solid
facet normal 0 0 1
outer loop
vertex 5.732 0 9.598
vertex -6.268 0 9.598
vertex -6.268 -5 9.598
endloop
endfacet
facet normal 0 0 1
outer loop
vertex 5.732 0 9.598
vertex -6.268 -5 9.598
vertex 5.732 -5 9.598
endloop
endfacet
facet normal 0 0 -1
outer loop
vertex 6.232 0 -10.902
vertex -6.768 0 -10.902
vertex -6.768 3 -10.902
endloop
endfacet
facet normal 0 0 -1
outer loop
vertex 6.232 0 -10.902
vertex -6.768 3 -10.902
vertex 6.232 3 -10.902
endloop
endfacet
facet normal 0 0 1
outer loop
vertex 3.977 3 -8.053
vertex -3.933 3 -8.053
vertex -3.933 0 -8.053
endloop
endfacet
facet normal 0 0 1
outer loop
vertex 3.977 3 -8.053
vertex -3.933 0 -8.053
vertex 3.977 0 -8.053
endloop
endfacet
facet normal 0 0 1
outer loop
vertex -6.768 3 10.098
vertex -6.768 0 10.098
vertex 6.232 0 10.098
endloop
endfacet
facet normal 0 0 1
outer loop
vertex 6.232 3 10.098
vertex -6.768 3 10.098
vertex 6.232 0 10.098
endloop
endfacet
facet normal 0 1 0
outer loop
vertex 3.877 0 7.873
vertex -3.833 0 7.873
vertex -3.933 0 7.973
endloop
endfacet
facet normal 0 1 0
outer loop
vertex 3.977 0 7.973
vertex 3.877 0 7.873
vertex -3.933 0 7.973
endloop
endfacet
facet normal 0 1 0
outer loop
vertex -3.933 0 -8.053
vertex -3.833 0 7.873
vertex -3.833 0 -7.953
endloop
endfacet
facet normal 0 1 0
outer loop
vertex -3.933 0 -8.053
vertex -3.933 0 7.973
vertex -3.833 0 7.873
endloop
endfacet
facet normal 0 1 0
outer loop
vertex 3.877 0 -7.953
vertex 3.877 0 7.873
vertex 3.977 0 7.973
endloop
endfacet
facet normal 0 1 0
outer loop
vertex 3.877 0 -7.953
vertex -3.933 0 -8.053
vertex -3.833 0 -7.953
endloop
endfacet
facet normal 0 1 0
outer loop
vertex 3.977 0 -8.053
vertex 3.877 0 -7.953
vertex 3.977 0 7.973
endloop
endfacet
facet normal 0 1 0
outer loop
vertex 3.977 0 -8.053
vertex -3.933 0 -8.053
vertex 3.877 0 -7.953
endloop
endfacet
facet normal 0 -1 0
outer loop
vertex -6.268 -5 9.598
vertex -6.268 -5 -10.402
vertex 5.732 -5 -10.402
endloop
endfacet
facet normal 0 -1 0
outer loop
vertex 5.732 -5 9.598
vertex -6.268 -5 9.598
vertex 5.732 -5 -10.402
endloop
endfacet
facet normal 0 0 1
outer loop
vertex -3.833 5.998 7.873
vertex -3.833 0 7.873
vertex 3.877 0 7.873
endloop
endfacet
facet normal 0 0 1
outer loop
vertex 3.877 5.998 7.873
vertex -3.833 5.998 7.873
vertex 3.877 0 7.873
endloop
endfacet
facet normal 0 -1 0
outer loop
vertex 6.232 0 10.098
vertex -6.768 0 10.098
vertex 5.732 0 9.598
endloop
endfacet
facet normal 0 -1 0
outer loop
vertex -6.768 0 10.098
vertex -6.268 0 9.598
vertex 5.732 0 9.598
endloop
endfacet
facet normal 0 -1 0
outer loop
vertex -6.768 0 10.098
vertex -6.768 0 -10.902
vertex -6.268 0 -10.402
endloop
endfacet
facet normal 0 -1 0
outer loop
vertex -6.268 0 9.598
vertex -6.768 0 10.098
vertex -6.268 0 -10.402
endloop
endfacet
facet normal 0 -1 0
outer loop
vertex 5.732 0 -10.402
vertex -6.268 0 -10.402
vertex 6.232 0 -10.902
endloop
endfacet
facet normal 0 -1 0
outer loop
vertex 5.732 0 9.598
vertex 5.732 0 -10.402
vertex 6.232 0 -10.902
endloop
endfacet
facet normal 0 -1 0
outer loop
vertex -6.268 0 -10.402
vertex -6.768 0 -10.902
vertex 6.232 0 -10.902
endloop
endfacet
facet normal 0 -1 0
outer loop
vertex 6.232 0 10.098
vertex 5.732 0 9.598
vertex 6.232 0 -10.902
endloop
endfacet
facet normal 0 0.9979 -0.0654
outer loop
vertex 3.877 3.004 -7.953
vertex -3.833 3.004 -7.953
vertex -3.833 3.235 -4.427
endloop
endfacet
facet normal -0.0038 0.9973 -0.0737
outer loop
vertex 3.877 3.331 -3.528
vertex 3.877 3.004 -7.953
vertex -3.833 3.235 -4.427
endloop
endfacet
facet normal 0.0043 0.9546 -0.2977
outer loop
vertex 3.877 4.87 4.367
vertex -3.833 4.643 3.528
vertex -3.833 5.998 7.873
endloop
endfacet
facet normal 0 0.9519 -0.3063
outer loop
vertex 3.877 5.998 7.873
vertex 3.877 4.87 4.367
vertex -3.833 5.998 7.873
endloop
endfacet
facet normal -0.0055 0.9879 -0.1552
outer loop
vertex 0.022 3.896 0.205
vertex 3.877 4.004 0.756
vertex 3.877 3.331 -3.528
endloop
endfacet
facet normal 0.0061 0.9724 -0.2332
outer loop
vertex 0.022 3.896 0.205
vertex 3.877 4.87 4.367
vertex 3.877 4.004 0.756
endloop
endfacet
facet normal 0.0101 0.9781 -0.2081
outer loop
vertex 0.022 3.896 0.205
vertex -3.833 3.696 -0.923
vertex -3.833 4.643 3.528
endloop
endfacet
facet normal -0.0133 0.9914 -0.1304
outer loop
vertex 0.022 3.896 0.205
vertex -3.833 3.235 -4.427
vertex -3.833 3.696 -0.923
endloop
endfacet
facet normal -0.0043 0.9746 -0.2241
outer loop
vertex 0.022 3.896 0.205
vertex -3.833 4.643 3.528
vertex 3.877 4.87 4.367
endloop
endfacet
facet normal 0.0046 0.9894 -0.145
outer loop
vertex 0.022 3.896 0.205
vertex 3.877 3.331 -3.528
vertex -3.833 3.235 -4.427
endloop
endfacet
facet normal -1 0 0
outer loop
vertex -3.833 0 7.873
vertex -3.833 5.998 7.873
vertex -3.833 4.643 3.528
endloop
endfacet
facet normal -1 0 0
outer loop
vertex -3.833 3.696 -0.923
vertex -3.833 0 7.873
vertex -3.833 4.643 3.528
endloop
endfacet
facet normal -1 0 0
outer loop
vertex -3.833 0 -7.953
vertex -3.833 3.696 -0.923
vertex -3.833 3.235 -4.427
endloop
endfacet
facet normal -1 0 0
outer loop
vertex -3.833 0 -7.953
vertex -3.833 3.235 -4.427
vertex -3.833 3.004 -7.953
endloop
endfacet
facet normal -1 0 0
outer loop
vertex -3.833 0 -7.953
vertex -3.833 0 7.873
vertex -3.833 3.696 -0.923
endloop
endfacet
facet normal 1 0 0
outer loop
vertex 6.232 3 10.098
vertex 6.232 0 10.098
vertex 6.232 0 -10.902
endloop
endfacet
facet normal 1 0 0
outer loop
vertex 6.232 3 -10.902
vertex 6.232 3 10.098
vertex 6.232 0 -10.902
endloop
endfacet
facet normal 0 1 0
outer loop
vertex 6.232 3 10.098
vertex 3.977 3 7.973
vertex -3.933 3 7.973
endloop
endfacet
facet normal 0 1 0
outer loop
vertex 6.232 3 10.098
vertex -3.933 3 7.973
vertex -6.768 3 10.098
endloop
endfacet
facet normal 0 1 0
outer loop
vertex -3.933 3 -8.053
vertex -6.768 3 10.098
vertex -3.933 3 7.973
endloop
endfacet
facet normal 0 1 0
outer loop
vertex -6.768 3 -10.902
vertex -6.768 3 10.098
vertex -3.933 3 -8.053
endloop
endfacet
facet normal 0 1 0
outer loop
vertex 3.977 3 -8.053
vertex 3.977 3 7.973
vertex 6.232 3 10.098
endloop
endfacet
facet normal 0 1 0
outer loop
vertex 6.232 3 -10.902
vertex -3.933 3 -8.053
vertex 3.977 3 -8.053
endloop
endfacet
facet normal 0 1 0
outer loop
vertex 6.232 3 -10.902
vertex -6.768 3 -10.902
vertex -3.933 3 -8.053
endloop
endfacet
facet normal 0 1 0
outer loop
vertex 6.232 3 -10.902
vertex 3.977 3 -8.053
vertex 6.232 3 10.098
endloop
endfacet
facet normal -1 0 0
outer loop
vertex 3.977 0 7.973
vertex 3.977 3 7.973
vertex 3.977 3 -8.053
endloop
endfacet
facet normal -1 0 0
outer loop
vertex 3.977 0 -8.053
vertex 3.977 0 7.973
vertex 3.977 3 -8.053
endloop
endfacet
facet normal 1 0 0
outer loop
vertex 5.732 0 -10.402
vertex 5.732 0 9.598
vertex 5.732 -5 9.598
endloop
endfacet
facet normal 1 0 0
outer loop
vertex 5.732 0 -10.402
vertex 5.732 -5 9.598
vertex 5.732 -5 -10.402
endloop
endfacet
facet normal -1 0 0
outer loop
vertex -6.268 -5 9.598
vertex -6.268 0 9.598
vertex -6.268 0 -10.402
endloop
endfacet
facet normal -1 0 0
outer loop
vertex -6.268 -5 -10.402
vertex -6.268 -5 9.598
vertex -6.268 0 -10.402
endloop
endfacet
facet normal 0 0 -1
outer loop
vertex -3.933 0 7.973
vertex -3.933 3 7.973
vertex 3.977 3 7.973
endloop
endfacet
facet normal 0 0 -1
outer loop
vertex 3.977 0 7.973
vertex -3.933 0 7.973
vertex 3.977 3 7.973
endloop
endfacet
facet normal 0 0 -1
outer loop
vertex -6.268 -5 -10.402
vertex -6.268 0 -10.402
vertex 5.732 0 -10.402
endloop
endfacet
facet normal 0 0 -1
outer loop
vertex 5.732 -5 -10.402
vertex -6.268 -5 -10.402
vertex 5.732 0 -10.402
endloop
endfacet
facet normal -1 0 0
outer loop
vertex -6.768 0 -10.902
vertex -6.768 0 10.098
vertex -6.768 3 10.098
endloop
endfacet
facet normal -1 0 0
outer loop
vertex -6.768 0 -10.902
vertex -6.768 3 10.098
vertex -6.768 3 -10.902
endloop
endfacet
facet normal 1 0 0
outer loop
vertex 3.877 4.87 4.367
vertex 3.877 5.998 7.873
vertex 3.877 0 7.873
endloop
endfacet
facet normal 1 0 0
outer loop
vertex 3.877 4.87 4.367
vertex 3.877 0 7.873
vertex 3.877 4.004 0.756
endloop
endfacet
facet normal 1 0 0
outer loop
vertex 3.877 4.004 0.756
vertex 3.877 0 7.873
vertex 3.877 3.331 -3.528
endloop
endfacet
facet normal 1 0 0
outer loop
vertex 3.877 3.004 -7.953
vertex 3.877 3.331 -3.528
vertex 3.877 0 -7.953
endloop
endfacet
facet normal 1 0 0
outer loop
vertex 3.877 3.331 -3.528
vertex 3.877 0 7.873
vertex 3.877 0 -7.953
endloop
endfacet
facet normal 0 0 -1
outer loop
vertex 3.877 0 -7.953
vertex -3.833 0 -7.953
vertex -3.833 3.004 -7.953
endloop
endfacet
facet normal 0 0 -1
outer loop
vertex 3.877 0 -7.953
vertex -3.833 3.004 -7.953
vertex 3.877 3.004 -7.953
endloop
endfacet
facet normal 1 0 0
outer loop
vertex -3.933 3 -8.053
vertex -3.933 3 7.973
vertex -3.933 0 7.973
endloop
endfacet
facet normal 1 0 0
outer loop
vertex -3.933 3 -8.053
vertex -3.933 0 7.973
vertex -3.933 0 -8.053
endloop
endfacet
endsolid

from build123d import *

# Parameters (mm, degrees)
SKETCH2_W                = 13
SKETCH2_H                = 21
SKETCH2_W_2              = 12
SKETCH2_H_2              = 20
BOSS_EXTRUDE1_DEPTH      = 3
BOSS_EXTRUDE2_DEPTH      = 3
BOSS_EXTRUDE2_DEPTH_BACK = 5
SKETCH2_2_W              = 12
SKETCH2_2_H              = 20
SKETCH3_W                = 7.910089125
SKETCH3_H                = 16.025972414
SKETCH3_W_2              = 7.710089125
SKETCH3_H_2              = 15.825972414
CUT_EXTRUDE1_DEPTH       = 3
SKETCH3_2_W              = 7.710089125
SKETCH3_2_H              = 15.825972414
BOSS_EXTRUDE3_DEPTH      = 3
CUT_EXTRUDE2_DEPTH       = 17.376015533


with BuildPart() as part:
    # Sketch2 → Boss-Extrude1 (new body)
    with BuildSketch(Plane(origin=(0, 0, 0), x_dir=(1, 0, 0), z_dir=(0, 1, 0))):
        with Locations((-0.268196817, 0.402295225)):
            Rectangle(SKETCH2_W, SKETCH2_H)
        with Locations((-0.268196817, 0.402295225)):
            Rectangle(SKETCH2_W_2, SKETCH2_H_2, mode=Mode.SUBTRACT)
    extrude(amount=BOSS_EXTRUDE1_DEPTH)

    # Sketch2<2> → Boss-Extrude2 (add, two sides: drawn at the far end of the back side and taken through both)
    with BuildSketch(Plane(origin=(0, 0, 0), x_dir=(1, 0, 0), z_dir=(0, 1, 0)).offset(-BOSS_EXTRUDE2_DEPTH_BACK)):
        with Locations((-0.268196817, 0.402295225)):
            Rectangle(SKETCH2_2_W, SKETCH2_2_H)
    extrude(amount=BOSS_EXTRUDE2_DEPTH + BOSS_EXTRUDE2_DEPTH_BACK)

    # Sketch3 → Cut-Extrude1 (cut)
    with BuildSketch(Plane(origin=(0, 3, 0), x_dir=(1, 0, 0), z_dir=(0, 1, 0))):
        with Locations((0.021656158, 0.039979007)):
            Rectangle(SKETCH3_W, SKETCH3_H)
        with Locations((0.021656157, 0.039979007)):
            Rectangle(SKETCH3_W_2, SKETCH3_H_2, mode=Mode.SUBTRACT)
    extrude(amount=-CUT_EXTRUDE1_DEPTH, mode=Mode.SUBTRACT)

    # Sketch3<2> → Boss-Extrude3 (add)
    with BuildSketch(Plane(origin=(0, 3, 0), x_dir=(1, 0, 0), z_dir=(0, 1, 0))):
        with Locations((0.021656157, 0.039979007)):
            Rectangle(SKETCH3_2_W, SKETCH3_2_H)
    extrude(amount=BOSS_EXTRUDE3_DEPTH)

    # Sketch5 → Cut-Extrude2 (cut, through all)
    with BuildSketch(Plane(origin=(3.87670072, 0, 0), x_dir=(0, 0, -1), z_dir=(1, 0, 0))):
        with BuildLine():
            add(Edge.make_bspline(
                [(7.952965214, 3.003696013), (-0.44948354, 3.292111909), (-7.8730072, 5.997516068)],
                knots=[0.001628514, 0.001628514, 0.001628514, 0.990717924, 0.990717924, 0.990717924], degree=2))
            Line((7.952965214, 3.003696013), (7.952965214, 6))
            Line((7.952965214, 6), (-7.8730072, 6))
            Line((-7.8730072, 6), (-7.8730072, 5.997516068))
        make_face()
    extrude(amount=-CUT_EXTRUDE2_DEPTH, mode=Mode.SUBTRACT)


solid = part.part
